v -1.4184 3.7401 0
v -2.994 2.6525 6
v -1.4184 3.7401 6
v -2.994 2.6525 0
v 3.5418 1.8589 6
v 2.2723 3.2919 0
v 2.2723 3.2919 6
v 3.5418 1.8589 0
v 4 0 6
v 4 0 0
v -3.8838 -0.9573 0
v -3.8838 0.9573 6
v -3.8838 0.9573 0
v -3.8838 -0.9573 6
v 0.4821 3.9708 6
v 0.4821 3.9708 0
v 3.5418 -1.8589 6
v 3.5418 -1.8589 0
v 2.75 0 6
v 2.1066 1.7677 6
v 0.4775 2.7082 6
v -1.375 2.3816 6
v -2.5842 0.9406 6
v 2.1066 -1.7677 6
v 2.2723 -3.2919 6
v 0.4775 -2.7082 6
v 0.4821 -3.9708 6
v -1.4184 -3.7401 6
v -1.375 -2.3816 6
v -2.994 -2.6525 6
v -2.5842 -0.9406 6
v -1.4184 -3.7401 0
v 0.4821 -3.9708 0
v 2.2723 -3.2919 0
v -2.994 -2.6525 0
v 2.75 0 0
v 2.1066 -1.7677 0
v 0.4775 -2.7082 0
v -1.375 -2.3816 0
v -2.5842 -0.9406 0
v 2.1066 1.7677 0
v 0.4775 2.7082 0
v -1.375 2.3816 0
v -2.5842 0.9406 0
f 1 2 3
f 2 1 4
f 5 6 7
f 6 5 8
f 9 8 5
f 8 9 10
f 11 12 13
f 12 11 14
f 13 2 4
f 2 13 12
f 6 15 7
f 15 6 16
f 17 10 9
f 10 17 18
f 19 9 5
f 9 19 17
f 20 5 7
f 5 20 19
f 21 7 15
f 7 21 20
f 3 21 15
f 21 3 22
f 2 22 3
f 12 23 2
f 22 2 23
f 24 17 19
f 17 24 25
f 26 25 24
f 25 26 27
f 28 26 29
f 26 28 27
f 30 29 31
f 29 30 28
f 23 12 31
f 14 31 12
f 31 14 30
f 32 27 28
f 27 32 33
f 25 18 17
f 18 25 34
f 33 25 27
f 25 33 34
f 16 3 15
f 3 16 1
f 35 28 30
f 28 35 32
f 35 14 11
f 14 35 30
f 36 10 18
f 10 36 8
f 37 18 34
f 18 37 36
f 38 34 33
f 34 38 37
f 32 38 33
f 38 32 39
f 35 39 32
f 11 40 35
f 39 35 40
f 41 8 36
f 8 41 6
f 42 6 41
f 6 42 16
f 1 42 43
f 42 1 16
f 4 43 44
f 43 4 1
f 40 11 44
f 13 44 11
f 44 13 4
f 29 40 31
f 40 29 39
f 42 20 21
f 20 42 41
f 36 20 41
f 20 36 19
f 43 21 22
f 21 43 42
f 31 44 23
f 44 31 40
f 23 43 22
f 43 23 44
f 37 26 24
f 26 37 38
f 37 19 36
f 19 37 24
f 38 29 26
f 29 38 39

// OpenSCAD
difference()
{
  cylinder(d = 8, h = 6);
  translate([0, 0, -1]) cylinder(d = 5.5, h = 12);
}
